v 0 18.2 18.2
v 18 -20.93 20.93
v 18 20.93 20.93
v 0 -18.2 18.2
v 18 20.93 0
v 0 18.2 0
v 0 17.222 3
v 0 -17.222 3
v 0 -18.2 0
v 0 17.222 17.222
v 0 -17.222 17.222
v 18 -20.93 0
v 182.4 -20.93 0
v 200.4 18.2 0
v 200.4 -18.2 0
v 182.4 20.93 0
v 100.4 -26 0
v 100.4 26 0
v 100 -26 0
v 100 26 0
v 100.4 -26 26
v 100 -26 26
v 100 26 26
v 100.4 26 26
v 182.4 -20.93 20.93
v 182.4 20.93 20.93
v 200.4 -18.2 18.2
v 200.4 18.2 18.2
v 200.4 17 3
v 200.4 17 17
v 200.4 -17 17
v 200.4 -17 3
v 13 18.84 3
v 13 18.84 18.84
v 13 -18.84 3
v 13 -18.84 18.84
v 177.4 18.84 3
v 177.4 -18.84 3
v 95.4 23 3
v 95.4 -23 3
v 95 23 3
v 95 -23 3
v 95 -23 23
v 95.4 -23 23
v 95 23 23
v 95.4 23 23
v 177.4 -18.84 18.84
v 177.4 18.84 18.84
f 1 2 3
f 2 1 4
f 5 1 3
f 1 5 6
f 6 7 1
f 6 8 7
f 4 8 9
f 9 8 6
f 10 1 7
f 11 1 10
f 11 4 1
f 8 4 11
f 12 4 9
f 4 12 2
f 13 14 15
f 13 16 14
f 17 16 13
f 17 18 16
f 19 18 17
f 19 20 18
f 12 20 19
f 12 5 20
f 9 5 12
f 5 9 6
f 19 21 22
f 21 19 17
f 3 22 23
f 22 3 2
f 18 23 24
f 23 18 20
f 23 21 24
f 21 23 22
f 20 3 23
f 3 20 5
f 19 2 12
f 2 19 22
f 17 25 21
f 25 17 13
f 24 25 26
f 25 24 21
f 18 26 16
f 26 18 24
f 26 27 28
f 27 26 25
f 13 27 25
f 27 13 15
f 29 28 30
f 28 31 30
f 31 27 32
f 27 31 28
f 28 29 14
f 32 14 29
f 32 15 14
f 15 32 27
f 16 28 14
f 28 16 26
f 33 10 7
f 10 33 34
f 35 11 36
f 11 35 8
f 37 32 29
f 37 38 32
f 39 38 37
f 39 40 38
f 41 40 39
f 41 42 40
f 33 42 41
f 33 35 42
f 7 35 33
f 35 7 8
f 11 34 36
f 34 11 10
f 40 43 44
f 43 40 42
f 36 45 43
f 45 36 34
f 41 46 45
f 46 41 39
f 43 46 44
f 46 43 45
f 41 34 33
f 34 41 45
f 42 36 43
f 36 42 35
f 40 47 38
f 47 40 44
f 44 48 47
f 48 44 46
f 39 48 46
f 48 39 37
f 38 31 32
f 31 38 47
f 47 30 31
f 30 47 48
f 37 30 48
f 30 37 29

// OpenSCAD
$fn = 32;

// ----------------------------------------------------------------------
// Faired channel: 200 x 52 x 26 mm, 3 mm walls, faired ends
// ----------------------------------------------------------------------

// --- parameters (mm) ---
length = 200;             // channel length
width = 52;               // channel width at mid length
height = 26;              // channel height at mid length
wall = 3;                 // side wall thickness
floor_t = 3;              // floor thickness
end_w = 36.4;             // faired end width
end_h = 18.2;             // faired end height

difference() {
  union() {
    hull() {
      translate([0, -18.2, 0]) cube([0.4, 36.4, 18.2]);
      translate([18, -20.93, 0]) cube([0.4, 41.86, 20.93]);
    }
    hull() {
      translate([18, -20.93, 0]) cube([0.4, 41.86, 20.93]);
      translate([100, -26, 0]) cube([0.4, 52, 26]);
    }
    hull() {
      translate([100, -26, 0]) cube([0.4, 52, 26]);
      translate([182, -20.93, 0]) cube([0.4, 41.86, 20.93]);
    }
    hull() {
      translate([182, -20.93, 0]) cube([0.4, 41.86, 20.93]);
      translate([200, -18.2, 0]) cube([0.4, 36.4, 18.2]);
    }
  }
  /* cavity, 5 mm proud of both ends so the ports are cut clean */
  hull() {
    translate([-5, -16.6, 3]) cube([0.4, 33.2, 13.6]);
    translate([13, -18.84, 3]) cube([0.4, 37.68, 15.84]);
  }
  hull() {
    translate([13, -18.84, 3]) cube([0.4, 37.68, 15.84]);
    translate([95, -23, 3]) cube([0.4, 46, 20]);
  }
  hull() {
    translate([95, -23, 3]) cube([0.4, 46, 20]);
    translate([177, -18.84, 3]) cube([0.4, 37.68, 15.84]);
  }
  hull() {
    translate([177, -18.84, 3]) cube([0.4, 37.68, 15.84]);
    translate([205, -16.6, 3]) cube([0.4, 33.2, 13.6]);
  }
}
